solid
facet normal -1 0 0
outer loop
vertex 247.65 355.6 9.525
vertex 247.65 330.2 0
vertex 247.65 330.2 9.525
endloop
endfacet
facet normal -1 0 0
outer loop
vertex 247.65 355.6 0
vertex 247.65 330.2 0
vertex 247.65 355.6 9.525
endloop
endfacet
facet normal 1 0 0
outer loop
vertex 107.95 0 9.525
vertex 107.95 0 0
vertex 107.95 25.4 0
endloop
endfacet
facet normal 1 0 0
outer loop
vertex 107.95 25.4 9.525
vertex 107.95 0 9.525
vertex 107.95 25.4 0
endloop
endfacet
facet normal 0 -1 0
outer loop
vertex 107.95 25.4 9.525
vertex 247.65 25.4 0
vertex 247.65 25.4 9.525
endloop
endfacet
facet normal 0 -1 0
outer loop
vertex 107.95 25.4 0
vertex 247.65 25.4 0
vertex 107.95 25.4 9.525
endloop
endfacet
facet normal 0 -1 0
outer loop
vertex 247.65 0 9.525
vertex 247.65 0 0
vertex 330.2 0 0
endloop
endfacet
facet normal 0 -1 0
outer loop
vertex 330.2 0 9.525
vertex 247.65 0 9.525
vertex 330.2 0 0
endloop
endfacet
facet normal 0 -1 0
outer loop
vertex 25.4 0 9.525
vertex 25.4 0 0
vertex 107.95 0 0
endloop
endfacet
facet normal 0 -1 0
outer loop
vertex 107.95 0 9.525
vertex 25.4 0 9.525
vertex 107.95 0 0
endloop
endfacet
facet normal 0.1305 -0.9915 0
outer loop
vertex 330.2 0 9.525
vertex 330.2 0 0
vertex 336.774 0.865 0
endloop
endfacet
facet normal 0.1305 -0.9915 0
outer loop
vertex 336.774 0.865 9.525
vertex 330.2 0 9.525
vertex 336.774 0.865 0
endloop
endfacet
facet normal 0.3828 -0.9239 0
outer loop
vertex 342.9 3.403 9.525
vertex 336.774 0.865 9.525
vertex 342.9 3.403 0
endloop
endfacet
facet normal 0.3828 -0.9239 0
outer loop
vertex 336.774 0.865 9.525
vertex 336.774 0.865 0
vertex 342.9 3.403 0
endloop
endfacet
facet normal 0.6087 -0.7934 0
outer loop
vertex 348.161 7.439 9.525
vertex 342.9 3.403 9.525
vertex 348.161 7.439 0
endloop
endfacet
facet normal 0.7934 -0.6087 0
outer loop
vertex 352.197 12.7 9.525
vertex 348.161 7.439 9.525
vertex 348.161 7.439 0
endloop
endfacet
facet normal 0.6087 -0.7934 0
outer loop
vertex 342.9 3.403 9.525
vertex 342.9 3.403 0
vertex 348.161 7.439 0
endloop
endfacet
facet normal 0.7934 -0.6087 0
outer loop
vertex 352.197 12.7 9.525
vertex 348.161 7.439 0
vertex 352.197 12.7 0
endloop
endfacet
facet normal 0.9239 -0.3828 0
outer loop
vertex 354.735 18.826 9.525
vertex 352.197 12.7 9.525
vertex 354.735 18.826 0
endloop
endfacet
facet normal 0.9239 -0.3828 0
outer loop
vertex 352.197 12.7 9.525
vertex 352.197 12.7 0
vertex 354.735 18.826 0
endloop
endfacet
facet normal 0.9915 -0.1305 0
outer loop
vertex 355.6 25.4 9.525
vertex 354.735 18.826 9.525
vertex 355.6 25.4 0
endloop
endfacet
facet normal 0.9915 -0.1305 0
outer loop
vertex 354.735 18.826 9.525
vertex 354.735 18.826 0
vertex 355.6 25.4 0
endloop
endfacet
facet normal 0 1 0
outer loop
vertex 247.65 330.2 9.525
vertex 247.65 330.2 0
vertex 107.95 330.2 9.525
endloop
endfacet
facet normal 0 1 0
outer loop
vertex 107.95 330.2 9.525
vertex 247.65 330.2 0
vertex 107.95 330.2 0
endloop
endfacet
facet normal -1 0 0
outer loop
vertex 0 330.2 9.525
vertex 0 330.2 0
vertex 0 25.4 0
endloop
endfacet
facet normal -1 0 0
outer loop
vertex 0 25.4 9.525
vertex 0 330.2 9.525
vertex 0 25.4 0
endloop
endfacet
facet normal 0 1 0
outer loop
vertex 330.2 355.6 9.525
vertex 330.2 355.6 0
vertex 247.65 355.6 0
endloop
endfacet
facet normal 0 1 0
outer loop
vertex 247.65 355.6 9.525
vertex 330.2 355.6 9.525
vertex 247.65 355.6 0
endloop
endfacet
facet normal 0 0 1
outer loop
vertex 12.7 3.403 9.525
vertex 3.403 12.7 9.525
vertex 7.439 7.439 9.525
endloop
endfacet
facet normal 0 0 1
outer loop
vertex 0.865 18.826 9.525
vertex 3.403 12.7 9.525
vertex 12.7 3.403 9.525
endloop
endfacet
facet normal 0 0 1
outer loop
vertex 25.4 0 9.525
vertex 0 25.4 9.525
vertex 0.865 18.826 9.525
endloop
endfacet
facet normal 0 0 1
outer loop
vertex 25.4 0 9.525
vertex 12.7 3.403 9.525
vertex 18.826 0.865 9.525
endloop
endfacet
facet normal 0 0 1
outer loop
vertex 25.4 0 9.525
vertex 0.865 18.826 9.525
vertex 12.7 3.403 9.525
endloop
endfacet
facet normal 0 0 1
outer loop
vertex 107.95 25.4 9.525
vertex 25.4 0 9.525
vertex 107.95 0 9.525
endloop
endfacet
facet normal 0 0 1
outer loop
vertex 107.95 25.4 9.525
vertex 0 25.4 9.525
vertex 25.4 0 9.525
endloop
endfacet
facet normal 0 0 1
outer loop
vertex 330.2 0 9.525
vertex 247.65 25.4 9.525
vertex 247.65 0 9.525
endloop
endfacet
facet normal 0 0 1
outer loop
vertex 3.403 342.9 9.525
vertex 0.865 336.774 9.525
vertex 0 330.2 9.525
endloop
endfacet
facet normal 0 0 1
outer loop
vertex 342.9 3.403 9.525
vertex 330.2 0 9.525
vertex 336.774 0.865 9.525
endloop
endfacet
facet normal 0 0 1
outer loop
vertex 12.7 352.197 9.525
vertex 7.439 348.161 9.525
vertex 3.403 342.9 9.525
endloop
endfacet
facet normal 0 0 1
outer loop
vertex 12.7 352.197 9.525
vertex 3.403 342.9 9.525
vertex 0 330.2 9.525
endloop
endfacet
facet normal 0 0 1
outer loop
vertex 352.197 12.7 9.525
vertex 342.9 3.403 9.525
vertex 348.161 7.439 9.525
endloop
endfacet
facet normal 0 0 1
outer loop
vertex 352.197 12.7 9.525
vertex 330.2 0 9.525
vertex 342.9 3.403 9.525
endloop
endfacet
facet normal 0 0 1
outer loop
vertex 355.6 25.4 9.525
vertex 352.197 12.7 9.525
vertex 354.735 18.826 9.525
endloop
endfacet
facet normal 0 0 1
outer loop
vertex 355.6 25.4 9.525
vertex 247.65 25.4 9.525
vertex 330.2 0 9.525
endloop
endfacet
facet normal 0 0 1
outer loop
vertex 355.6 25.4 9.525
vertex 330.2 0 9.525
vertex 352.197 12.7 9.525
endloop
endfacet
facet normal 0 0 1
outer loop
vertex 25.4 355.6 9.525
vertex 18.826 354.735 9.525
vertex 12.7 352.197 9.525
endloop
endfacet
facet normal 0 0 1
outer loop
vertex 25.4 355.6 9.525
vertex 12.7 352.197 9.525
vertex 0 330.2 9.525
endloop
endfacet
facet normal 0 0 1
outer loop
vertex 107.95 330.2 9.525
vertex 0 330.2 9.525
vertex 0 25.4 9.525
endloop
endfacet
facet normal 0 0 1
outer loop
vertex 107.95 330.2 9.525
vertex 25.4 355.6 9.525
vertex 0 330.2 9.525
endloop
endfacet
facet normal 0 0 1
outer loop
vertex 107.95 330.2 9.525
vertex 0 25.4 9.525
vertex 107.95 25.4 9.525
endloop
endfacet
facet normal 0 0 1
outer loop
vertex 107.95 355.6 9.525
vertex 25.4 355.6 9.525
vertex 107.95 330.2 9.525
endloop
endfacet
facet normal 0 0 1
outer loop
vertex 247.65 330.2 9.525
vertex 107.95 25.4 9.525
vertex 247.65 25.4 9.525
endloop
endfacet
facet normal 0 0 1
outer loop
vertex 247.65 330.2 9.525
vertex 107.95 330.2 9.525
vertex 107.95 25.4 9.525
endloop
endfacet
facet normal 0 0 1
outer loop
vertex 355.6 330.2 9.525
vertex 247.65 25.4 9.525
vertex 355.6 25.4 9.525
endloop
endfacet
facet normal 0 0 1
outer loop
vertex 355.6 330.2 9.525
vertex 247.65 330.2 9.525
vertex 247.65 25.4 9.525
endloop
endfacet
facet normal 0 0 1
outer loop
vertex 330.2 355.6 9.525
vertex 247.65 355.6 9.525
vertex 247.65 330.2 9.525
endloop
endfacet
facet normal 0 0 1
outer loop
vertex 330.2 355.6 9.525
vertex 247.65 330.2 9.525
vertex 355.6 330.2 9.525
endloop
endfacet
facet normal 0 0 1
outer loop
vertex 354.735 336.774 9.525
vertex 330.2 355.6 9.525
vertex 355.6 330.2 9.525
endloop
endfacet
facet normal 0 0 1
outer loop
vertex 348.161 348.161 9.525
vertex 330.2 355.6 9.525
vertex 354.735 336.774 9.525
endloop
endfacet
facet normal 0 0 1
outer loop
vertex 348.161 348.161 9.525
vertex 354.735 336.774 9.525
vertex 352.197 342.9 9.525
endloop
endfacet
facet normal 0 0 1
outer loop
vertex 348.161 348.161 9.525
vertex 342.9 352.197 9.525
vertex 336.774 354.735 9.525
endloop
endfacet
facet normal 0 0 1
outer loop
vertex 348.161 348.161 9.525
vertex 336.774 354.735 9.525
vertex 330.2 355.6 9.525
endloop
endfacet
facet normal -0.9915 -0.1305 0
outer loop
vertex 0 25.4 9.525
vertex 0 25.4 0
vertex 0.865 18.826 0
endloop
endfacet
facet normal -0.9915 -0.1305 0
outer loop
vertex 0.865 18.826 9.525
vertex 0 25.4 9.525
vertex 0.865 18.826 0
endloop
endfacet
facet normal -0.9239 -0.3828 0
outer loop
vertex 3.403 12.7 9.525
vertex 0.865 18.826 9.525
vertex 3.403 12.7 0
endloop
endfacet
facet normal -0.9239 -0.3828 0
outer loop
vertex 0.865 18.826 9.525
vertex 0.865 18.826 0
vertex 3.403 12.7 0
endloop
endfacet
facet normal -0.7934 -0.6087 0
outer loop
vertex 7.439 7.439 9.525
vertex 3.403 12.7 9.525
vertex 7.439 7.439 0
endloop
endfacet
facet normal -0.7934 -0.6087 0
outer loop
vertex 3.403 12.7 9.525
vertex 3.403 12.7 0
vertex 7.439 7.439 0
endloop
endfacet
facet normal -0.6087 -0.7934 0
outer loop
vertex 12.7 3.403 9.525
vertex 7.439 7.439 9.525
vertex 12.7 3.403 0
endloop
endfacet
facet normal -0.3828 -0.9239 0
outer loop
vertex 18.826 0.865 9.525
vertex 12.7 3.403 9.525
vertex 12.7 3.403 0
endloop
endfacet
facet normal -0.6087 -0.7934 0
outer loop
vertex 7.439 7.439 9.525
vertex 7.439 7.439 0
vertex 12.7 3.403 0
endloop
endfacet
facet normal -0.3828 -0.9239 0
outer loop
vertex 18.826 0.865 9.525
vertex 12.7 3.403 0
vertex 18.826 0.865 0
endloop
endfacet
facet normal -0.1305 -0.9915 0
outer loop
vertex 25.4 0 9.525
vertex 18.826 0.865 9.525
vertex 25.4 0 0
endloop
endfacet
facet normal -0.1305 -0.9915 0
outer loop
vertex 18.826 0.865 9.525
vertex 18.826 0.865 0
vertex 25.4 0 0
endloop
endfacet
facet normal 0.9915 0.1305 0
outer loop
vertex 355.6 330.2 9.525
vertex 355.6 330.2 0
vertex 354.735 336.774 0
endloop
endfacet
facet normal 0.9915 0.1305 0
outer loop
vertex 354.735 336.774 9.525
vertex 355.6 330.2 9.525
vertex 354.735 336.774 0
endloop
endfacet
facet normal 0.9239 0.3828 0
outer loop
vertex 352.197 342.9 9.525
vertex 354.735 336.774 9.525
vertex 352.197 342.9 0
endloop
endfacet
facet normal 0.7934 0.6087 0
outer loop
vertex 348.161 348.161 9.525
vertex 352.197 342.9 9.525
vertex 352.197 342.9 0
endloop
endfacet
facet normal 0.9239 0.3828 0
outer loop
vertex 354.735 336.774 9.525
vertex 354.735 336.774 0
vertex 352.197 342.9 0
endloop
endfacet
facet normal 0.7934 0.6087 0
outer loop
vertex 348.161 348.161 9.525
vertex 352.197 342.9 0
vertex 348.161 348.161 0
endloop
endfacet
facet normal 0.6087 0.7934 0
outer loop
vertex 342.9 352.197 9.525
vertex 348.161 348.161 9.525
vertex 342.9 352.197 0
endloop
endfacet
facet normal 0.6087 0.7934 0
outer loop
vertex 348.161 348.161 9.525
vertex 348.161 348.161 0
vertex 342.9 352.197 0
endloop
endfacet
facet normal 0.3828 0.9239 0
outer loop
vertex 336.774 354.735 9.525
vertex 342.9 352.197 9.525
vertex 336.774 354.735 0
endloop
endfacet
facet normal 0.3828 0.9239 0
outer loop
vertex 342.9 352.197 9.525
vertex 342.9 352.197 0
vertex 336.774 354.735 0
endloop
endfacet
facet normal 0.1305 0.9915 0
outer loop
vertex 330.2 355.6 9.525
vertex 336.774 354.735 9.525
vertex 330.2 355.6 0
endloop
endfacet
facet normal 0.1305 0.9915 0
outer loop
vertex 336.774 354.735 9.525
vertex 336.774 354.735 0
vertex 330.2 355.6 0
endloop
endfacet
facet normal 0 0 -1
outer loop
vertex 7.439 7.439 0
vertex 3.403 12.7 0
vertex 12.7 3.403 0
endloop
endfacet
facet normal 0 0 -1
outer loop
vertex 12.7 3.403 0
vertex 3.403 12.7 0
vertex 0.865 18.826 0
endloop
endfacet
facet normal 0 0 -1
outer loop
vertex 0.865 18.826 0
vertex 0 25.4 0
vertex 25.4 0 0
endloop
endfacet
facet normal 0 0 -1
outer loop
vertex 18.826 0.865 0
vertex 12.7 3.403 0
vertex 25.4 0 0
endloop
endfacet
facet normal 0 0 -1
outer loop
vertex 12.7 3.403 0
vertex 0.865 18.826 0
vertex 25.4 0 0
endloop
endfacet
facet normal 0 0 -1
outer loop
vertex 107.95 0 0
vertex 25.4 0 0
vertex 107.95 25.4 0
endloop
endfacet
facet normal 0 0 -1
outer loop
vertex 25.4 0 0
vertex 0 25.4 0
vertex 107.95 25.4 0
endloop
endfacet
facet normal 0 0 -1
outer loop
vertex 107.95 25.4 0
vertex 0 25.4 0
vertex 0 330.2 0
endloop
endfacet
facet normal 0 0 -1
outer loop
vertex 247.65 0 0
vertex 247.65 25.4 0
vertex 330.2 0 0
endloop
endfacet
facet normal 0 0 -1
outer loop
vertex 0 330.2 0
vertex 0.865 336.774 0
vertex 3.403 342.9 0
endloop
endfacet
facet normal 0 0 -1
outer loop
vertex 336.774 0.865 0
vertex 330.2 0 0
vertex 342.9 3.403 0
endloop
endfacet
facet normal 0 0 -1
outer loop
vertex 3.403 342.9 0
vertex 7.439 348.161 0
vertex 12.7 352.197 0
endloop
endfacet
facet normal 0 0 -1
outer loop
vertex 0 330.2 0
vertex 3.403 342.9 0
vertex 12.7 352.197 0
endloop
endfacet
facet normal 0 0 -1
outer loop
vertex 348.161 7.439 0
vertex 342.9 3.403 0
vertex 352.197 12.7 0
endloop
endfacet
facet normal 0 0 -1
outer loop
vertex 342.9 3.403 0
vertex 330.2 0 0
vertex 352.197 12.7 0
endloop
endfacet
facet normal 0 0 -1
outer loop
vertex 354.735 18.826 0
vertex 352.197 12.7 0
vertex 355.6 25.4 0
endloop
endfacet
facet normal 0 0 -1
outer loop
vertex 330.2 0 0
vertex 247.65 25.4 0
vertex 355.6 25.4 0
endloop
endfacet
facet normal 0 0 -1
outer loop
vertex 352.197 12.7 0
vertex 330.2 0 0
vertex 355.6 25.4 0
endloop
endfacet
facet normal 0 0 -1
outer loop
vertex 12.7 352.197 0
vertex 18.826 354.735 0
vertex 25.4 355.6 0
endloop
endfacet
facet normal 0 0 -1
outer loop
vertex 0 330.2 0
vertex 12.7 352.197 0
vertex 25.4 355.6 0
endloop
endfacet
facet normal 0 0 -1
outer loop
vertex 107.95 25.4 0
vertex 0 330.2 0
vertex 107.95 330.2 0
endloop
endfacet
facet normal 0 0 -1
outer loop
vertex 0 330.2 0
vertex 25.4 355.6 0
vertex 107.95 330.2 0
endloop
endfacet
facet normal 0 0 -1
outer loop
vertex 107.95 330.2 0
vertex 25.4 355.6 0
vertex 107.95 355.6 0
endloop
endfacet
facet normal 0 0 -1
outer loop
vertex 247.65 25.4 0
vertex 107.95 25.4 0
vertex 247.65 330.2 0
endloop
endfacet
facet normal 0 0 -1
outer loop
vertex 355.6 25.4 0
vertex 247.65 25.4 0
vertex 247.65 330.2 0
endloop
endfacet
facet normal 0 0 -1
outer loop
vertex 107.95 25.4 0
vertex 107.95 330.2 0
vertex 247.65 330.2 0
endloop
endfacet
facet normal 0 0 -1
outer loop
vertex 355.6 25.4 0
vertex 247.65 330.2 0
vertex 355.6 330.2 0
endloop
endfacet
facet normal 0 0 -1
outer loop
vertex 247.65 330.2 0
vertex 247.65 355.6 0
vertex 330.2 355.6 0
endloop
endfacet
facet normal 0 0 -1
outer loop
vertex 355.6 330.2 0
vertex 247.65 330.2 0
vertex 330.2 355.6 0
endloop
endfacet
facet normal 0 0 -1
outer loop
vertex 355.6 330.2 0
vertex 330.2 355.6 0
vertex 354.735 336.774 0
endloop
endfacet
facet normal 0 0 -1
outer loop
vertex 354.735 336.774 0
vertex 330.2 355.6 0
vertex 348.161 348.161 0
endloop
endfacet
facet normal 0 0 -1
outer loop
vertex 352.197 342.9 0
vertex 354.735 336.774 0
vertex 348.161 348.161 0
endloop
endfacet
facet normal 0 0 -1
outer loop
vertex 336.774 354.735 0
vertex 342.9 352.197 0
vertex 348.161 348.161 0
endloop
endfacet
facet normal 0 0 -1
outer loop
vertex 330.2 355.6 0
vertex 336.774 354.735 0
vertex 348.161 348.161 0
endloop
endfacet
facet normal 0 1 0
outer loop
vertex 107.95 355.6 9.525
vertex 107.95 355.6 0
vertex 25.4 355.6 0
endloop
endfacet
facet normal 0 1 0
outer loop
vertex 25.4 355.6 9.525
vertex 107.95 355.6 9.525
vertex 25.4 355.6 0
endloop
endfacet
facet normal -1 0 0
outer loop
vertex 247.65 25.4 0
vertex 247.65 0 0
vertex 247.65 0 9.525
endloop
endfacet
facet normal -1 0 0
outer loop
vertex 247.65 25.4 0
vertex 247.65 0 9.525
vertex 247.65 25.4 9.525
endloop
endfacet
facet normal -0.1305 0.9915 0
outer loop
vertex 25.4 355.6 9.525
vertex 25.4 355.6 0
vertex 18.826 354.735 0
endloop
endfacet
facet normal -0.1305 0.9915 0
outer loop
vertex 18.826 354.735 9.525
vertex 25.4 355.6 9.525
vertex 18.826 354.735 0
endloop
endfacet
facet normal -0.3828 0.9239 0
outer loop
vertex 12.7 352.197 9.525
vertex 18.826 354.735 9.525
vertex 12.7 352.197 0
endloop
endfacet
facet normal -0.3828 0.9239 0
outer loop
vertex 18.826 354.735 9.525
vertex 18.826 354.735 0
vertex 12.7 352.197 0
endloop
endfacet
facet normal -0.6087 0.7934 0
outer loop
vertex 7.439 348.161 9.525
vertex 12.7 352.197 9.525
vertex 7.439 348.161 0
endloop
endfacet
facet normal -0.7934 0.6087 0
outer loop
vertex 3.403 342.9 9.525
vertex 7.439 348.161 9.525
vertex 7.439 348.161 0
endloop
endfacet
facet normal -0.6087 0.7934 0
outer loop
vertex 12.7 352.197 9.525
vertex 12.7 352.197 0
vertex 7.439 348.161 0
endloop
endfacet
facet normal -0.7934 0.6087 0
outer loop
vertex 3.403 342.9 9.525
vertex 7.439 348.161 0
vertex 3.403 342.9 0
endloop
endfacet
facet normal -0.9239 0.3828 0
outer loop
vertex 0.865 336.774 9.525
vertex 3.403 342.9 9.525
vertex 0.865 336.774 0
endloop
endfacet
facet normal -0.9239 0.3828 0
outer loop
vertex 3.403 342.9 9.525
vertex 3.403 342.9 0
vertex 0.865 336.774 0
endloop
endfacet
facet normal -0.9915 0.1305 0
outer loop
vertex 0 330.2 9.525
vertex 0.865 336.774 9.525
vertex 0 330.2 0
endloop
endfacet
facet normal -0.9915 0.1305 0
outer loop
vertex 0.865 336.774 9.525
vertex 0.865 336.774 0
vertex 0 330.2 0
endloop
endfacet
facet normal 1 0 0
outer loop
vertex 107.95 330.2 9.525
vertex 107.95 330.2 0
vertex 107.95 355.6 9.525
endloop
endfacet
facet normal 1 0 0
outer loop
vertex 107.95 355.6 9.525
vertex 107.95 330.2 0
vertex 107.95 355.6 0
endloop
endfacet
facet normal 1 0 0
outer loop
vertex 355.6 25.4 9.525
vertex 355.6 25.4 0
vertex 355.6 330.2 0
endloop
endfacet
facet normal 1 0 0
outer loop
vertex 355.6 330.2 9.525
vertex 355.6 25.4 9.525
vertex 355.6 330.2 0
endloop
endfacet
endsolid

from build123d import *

# Parameters (mm, degrees)
BOSS_EXTRUDE1_DEPTH = 9.525
SKETCH2_W           = 139.7
SKETCH2_H           = 25.4
CUT_EXTRUDE1_DEPTH  = 503.984538157


with BuildPart() as part:
    # Sketch1 → Boss-Extrude1 (new body)
    with BuildSketch(Plane.XY):
        with BuildLine():
            Line((25.4, 0), (330.2, 0))
            ThreePointArc((330.2, 0), (348.160512242, 7.439487758), (355.6, 25.4))
            Line((355.6, 25.4), (355.6, 330.2))
            ThreePointArc((355.6, 330.2), (348.160512242, 348.160512242), (330.2, 355.6))
            Line((330.2, 355.6), (25.4, 355.6))
            ThreePointArc((25.4, 355.6), (7.439487758, 348.160512242), (0, 330.2))
            Line((0, 330.2), (0, 25.4))
            ThreePointArc((0, 25.4), (7.439487758, 7.439487758), (25.4, 0))
        make_face()
    extrude(amount=BOSS_EXTRUDE1_DEPTH)

    # Sketch2 → Cut-Extrude1 (cut, through all)
    with BuildSketch(Plane(origin=(0, 0, 0), x_dir=(-1, 0, 0), z_dir=(0, 0, -1))):
        with Locations((-177.8, 342.9)):
            Rectangle(SKETCH2_W, SKETCH2_H)
        with Locations((-177.8, 12.7)):
            Rectangle(SKETCH2_W, SKETCH2_H)
    extrude(amount=-CUT_EXTRUDE1_DEPTH, mode=Mode.SUBTRACT)


solid = part.part
